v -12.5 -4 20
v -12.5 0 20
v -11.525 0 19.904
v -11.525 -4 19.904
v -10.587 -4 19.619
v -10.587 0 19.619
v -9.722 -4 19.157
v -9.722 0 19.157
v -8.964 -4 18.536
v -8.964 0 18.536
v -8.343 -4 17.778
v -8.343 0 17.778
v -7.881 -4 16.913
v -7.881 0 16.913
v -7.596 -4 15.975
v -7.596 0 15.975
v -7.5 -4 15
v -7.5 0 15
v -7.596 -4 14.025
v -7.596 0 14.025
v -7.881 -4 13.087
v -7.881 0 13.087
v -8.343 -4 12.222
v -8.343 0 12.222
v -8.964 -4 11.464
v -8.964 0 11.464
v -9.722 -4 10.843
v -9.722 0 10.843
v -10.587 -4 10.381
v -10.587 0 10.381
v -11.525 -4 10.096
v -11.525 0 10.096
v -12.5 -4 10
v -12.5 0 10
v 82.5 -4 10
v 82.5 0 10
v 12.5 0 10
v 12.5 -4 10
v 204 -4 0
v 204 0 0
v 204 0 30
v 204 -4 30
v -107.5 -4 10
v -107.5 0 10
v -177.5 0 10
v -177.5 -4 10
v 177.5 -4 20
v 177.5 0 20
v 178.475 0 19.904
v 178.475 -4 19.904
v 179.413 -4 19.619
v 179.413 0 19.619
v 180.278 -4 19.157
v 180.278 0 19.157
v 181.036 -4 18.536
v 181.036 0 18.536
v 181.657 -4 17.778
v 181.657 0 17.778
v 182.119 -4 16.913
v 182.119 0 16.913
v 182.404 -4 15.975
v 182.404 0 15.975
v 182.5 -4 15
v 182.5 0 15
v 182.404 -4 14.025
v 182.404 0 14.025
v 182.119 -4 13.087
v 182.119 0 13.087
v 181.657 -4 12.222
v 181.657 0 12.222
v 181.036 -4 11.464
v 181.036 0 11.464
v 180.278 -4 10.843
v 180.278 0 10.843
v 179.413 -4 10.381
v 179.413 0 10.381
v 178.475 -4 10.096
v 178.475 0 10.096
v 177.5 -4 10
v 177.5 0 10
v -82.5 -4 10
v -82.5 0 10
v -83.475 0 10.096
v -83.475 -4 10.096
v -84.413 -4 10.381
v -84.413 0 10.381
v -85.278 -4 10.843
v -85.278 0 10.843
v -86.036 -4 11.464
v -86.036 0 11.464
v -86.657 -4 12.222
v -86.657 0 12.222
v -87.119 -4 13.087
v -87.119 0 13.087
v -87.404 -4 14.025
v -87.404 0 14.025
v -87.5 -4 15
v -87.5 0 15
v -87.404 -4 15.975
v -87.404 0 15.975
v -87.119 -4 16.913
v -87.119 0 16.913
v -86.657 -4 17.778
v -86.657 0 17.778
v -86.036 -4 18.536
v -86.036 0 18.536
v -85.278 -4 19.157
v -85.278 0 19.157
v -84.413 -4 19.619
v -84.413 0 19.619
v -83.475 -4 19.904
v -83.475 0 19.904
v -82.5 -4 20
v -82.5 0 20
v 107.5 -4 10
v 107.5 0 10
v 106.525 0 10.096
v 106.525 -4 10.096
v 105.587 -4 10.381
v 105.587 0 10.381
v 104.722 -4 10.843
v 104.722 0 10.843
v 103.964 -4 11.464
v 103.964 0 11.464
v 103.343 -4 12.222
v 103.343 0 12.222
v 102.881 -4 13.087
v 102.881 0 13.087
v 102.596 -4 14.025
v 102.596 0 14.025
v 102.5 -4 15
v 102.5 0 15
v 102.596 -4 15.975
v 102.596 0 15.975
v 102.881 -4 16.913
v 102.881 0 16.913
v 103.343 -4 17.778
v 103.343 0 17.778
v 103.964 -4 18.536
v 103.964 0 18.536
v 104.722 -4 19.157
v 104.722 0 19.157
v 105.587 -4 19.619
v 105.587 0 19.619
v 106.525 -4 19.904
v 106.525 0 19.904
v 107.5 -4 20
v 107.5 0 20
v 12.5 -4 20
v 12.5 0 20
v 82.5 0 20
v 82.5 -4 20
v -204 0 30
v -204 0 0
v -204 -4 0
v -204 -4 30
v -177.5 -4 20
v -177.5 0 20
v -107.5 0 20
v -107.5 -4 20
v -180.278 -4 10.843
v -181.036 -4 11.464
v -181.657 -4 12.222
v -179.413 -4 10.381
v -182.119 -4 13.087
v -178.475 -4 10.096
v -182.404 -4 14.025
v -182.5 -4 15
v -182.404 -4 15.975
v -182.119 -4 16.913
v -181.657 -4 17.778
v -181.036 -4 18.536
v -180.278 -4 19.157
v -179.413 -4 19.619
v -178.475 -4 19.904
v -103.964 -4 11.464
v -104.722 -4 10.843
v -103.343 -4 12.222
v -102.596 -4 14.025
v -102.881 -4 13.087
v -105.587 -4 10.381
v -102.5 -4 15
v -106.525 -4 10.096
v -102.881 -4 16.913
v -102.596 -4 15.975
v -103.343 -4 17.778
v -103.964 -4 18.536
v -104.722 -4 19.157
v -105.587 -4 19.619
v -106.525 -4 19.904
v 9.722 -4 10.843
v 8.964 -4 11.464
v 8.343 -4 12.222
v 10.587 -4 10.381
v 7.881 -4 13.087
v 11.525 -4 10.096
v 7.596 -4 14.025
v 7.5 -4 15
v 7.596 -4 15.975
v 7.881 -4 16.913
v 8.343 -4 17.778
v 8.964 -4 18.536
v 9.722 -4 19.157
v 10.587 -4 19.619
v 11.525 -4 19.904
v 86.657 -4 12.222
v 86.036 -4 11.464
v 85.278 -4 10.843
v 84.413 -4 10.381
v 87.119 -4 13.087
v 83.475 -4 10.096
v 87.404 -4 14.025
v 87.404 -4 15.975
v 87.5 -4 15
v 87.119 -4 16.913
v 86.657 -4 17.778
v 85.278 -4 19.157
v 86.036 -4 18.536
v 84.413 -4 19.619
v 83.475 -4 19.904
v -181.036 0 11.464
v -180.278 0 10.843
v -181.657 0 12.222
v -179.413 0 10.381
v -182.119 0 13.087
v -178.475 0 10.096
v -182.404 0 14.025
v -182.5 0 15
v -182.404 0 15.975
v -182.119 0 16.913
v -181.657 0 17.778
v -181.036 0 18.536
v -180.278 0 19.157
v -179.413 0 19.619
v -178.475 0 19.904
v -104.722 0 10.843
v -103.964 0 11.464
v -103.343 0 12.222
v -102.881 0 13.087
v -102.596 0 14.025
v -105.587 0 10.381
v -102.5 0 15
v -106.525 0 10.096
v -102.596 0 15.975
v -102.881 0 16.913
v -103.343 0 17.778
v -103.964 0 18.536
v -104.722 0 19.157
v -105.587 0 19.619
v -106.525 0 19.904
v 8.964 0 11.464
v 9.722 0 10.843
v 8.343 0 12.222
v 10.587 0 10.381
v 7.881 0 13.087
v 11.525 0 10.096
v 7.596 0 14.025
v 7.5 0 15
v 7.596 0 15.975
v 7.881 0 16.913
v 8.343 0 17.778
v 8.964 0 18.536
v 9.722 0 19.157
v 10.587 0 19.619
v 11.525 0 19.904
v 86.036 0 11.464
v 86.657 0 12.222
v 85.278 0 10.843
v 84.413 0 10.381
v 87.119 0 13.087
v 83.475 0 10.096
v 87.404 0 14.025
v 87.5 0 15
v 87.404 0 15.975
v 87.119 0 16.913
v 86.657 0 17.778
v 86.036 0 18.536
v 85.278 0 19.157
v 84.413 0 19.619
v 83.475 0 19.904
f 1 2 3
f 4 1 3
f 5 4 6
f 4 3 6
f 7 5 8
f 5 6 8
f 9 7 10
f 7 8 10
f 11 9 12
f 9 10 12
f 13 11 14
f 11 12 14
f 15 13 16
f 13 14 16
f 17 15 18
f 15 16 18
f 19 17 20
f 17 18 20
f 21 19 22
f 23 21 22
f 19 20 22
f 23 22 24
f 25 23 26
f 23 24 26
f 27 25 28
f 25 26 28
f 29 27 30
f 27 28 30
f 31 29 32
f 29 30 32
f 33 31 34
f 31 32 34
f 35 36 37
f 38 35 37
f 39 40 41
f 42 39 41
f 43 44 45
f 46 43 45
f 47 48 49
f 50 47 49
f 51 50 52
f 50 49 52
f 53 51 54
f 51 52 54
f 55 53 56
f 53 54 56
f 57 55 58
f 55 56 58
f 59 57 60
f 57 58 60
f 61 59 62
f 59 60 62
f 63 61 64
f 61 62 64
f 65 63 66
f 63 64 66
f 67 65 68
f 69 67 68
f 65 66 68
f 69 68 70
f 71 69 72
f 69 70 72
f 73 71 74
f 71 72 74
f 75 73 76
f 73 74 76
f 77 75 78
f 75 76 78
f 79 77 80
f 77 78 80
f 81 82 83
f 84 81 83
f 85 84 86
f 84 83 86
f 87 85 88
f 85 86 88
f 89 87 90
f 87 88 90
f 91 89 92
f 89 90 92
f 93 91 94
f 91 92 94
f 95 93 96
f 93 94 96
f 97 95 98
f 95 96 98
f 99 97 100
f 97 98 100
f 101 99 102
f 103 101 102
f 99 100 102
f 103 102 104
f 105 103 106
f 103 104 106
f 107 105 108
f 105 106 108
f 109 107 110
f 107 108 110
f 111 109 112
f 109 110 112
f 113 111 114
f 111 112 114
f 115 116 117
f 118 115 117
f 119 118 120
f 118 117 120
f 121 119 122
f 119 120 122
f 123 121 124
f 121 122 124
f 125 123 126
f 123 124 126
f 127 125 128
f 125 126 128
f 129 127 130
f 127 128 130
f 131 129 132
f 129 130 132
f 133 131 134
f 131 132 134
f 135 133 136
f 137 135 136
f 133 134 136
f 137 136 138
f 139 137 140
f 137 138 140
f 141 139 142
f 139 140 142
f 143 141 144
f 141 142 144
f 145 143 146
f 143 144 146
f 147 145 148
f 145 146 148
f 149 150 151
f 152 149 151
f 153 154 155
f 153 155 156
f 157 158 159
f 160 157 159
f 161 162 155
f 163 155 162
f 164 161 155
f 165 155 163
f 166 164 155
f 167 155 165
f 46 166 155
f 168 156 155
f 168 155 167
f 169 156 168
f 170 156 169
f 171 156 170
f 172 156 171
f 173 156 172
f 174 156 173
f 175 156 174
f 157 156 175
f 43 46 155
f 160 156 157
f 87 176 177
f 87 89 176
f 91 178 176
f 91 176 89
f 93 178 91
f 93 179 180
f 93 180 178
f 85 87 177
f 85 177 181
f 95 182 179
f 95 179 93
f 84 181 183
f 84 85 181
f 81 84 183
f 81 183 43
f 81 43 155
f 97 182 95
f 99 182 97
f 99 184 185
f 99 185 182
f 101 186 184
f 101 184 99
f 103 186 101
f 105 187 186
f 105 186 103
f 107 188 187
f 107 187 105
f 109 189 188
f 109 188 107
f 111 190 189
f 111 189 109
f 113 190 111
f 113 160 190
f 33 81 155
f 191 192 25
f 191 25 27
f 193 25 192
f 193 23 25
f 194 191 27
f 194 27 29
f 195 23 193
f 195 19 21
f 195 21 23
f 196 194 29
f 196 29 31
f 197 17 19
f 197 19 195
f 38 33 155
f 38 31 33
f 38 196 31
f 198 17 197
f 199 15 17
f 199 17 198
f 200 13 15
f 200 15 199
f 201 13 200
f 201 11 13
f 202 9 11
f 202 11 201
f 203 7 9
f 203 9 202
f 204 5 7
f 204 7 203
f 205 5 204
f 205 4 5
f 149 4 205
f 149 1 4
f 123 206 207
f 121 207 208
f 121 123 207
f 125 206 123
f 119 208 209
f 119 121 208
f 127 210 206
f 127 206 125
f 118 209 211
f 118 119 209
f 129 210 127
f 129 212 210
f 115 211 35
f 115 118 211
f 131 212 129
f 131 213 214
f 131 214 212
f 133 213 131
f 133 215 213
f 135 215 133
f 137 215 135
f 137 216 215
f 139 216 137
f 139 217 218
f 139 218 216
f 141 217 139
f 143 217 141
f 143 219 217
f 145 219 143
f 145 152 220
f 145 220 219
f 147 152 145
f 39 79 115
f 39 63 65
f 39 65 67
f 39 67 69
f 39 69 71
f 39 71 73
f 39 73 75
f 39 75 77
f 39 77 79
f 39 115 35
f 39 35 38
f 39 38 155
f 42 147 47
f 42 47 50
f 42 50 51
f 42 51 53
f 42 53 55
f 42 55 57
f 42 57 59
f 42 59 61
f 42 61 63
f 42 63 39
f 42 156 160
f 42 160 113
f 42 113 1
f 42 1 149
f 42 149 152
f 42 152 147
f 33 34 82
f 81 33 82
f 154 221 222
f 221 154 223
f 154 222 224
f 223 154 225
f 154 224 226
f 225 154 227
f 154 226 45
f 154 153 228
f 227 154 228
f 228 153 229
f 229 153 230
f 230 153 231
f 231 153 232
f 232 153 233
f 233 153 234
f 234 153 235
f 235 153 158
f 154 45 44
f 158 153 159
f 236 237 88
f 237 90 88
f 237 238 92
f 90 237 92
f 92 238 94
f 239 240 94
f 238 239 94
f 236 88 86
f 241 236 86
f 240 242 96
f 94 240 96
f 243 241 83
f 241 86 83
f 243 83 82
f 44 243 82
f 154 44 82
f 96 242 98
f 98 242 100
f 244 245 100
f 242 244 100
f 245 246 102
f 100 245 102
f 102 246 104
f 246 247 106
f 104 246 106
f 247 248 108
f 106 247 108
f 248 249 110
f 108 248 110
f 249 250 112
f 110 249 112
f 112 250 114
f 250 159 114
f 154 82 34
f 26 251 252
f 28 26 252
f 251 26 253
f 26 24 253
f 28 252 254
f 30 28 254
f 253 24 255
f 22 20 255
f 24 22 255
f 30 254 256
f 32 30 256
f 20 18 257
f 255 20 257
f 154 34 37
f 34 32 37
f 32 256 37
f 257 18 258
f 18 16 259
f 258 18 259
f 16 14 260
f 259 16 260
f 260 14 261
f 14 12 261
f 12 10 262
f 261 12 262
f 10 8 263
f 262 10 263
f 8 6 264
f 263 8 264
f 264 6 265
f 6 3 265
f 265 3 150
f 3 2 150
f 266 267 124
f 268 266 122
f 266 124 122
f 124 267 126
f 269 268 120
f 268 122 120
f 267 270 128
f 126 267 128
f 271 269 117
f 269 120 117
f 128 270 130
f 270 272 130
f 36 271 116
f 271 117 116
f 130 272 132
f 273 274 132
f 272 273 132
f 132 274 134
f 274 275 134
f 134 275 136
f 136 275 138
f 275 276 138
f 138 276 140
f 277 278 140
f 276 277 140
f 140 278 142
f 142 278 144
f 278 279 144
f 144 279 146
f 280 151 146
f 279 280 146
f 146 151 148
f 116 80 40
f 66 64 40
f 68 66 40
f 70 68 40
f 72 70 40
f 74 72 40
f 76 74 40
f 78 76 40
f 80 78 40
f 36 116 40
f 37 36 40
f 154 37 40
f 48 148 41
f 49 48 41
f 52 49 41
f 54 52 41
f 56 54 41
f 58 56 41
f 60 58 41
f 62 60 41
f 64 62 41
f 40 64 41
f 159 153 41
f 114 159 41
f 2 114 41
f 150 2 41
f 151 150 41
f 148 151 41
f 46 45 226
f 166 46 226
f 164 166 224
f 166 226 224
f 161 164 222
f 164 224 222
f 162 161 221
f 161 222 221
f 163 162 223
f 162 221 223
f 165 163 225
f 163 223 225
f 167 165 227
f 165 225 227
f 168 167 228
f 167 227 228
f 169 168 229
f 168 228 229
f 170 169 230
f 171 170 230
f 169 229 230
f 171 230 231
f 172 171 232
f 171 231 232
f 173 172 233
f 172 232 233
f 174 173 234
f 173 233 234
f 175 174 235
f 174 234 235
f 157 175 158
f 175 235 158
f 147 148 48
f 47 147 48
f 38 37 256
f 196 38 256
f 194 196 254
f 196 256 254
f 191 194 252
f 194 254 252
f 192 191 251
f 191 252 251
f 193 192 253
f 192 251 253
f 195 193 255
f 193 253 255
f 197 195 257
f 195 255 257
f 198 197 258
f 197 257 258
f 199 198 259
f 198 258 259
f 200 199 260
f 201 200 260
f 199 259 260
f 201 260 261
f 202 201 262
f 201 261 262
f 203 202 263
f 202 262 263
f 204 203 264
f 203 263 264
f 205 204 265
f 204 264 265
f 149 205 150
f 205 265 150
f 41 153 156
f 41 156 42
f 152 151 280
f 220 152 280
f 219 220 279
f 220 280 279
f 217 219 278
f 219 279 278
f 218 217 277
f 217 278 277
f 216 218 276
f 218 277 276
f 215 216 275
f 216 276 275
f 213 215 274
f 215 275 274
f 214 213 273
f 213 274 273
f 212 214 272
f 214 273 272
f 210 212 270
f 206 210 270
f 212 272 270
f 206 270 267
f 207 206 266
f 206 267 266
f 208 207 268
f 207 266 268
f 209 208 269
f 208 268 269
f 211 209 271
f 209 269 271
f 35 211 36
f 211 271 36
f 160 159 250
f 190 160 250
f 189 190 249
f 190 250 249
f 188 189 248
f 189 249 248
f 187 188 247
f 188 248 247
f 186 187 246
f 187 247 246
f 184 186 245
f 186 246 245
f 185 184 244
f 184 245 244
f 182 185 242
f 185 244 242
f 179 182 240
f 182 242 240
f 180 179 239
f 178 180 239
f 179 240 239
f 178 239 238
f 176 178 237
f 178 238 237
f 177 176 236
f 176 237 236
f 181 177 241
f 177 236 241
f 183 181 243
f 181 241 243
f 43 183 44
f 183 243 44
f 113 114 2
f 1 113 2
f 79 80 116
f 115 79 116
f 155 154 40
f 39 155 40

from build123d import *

# Parameters (mm, degrees)
F0_W     = 408
F0_H     = 30
F1_DEPTH = 4


with BuildPart() as f1:
    # F0 (on Front) → F1 (new body)
    with BuildSketch(Plane.XZ):
        with Locations((0, 15)):
            Rectangle(F0_W, F0_H)
        with BuildLine():
            ThreePointArc((-177.5, 10), (-182.5, 15), (-177.5, 20))
            Line((-177.5, 20), (-107.5, 20))
            ThreePointArc((-107.5, 20), (-102.5, 15), (-107.5, 10))
            Line((-107.5, 10), (-177.5, 10))
        make_face(mode=Mode.SUBTRACT)
        with BuildLine():
            ThreePointArc((-82.5, 10), (-87.5, 15), (-82.5, 20))
            Line((-82.5, 20), (-12.5, 20))
            ThreePointArc((-12.5, 20), (-7.5, 15), (-12.5, 10))
            Line((-12.5, 10), (-82.5, 10))
        make_face(mode=Mode.SUBTRACT)
        with BuildLine():
            ThreePointArc((12.5, 10), (7.5, 15), (12.5, 20))
            Line((12.5, 20), (82.5, 20))
            ThreePointArc((82.5, 20), (87.5, 15), (82.5, 10))
            Line((82.5, 10), (12.5, 10))
        make_face(mode=Mode.SUBTRACT)
        with BuildLine():
            ThreePointArc((107.5, 10), (102.5, 15), (107.5, 20))
            Line((107.5, 20), (177.5, 20))
            ThreePointArc((177.5, 20), (182.5, 15), (177.5, 10))
            Line((177.5, 10), (107.5, 10))
        make_face(mode=Mode.SUBTRACT)
    extrude(amount=F1_DEPTH)


solid = f1.part
